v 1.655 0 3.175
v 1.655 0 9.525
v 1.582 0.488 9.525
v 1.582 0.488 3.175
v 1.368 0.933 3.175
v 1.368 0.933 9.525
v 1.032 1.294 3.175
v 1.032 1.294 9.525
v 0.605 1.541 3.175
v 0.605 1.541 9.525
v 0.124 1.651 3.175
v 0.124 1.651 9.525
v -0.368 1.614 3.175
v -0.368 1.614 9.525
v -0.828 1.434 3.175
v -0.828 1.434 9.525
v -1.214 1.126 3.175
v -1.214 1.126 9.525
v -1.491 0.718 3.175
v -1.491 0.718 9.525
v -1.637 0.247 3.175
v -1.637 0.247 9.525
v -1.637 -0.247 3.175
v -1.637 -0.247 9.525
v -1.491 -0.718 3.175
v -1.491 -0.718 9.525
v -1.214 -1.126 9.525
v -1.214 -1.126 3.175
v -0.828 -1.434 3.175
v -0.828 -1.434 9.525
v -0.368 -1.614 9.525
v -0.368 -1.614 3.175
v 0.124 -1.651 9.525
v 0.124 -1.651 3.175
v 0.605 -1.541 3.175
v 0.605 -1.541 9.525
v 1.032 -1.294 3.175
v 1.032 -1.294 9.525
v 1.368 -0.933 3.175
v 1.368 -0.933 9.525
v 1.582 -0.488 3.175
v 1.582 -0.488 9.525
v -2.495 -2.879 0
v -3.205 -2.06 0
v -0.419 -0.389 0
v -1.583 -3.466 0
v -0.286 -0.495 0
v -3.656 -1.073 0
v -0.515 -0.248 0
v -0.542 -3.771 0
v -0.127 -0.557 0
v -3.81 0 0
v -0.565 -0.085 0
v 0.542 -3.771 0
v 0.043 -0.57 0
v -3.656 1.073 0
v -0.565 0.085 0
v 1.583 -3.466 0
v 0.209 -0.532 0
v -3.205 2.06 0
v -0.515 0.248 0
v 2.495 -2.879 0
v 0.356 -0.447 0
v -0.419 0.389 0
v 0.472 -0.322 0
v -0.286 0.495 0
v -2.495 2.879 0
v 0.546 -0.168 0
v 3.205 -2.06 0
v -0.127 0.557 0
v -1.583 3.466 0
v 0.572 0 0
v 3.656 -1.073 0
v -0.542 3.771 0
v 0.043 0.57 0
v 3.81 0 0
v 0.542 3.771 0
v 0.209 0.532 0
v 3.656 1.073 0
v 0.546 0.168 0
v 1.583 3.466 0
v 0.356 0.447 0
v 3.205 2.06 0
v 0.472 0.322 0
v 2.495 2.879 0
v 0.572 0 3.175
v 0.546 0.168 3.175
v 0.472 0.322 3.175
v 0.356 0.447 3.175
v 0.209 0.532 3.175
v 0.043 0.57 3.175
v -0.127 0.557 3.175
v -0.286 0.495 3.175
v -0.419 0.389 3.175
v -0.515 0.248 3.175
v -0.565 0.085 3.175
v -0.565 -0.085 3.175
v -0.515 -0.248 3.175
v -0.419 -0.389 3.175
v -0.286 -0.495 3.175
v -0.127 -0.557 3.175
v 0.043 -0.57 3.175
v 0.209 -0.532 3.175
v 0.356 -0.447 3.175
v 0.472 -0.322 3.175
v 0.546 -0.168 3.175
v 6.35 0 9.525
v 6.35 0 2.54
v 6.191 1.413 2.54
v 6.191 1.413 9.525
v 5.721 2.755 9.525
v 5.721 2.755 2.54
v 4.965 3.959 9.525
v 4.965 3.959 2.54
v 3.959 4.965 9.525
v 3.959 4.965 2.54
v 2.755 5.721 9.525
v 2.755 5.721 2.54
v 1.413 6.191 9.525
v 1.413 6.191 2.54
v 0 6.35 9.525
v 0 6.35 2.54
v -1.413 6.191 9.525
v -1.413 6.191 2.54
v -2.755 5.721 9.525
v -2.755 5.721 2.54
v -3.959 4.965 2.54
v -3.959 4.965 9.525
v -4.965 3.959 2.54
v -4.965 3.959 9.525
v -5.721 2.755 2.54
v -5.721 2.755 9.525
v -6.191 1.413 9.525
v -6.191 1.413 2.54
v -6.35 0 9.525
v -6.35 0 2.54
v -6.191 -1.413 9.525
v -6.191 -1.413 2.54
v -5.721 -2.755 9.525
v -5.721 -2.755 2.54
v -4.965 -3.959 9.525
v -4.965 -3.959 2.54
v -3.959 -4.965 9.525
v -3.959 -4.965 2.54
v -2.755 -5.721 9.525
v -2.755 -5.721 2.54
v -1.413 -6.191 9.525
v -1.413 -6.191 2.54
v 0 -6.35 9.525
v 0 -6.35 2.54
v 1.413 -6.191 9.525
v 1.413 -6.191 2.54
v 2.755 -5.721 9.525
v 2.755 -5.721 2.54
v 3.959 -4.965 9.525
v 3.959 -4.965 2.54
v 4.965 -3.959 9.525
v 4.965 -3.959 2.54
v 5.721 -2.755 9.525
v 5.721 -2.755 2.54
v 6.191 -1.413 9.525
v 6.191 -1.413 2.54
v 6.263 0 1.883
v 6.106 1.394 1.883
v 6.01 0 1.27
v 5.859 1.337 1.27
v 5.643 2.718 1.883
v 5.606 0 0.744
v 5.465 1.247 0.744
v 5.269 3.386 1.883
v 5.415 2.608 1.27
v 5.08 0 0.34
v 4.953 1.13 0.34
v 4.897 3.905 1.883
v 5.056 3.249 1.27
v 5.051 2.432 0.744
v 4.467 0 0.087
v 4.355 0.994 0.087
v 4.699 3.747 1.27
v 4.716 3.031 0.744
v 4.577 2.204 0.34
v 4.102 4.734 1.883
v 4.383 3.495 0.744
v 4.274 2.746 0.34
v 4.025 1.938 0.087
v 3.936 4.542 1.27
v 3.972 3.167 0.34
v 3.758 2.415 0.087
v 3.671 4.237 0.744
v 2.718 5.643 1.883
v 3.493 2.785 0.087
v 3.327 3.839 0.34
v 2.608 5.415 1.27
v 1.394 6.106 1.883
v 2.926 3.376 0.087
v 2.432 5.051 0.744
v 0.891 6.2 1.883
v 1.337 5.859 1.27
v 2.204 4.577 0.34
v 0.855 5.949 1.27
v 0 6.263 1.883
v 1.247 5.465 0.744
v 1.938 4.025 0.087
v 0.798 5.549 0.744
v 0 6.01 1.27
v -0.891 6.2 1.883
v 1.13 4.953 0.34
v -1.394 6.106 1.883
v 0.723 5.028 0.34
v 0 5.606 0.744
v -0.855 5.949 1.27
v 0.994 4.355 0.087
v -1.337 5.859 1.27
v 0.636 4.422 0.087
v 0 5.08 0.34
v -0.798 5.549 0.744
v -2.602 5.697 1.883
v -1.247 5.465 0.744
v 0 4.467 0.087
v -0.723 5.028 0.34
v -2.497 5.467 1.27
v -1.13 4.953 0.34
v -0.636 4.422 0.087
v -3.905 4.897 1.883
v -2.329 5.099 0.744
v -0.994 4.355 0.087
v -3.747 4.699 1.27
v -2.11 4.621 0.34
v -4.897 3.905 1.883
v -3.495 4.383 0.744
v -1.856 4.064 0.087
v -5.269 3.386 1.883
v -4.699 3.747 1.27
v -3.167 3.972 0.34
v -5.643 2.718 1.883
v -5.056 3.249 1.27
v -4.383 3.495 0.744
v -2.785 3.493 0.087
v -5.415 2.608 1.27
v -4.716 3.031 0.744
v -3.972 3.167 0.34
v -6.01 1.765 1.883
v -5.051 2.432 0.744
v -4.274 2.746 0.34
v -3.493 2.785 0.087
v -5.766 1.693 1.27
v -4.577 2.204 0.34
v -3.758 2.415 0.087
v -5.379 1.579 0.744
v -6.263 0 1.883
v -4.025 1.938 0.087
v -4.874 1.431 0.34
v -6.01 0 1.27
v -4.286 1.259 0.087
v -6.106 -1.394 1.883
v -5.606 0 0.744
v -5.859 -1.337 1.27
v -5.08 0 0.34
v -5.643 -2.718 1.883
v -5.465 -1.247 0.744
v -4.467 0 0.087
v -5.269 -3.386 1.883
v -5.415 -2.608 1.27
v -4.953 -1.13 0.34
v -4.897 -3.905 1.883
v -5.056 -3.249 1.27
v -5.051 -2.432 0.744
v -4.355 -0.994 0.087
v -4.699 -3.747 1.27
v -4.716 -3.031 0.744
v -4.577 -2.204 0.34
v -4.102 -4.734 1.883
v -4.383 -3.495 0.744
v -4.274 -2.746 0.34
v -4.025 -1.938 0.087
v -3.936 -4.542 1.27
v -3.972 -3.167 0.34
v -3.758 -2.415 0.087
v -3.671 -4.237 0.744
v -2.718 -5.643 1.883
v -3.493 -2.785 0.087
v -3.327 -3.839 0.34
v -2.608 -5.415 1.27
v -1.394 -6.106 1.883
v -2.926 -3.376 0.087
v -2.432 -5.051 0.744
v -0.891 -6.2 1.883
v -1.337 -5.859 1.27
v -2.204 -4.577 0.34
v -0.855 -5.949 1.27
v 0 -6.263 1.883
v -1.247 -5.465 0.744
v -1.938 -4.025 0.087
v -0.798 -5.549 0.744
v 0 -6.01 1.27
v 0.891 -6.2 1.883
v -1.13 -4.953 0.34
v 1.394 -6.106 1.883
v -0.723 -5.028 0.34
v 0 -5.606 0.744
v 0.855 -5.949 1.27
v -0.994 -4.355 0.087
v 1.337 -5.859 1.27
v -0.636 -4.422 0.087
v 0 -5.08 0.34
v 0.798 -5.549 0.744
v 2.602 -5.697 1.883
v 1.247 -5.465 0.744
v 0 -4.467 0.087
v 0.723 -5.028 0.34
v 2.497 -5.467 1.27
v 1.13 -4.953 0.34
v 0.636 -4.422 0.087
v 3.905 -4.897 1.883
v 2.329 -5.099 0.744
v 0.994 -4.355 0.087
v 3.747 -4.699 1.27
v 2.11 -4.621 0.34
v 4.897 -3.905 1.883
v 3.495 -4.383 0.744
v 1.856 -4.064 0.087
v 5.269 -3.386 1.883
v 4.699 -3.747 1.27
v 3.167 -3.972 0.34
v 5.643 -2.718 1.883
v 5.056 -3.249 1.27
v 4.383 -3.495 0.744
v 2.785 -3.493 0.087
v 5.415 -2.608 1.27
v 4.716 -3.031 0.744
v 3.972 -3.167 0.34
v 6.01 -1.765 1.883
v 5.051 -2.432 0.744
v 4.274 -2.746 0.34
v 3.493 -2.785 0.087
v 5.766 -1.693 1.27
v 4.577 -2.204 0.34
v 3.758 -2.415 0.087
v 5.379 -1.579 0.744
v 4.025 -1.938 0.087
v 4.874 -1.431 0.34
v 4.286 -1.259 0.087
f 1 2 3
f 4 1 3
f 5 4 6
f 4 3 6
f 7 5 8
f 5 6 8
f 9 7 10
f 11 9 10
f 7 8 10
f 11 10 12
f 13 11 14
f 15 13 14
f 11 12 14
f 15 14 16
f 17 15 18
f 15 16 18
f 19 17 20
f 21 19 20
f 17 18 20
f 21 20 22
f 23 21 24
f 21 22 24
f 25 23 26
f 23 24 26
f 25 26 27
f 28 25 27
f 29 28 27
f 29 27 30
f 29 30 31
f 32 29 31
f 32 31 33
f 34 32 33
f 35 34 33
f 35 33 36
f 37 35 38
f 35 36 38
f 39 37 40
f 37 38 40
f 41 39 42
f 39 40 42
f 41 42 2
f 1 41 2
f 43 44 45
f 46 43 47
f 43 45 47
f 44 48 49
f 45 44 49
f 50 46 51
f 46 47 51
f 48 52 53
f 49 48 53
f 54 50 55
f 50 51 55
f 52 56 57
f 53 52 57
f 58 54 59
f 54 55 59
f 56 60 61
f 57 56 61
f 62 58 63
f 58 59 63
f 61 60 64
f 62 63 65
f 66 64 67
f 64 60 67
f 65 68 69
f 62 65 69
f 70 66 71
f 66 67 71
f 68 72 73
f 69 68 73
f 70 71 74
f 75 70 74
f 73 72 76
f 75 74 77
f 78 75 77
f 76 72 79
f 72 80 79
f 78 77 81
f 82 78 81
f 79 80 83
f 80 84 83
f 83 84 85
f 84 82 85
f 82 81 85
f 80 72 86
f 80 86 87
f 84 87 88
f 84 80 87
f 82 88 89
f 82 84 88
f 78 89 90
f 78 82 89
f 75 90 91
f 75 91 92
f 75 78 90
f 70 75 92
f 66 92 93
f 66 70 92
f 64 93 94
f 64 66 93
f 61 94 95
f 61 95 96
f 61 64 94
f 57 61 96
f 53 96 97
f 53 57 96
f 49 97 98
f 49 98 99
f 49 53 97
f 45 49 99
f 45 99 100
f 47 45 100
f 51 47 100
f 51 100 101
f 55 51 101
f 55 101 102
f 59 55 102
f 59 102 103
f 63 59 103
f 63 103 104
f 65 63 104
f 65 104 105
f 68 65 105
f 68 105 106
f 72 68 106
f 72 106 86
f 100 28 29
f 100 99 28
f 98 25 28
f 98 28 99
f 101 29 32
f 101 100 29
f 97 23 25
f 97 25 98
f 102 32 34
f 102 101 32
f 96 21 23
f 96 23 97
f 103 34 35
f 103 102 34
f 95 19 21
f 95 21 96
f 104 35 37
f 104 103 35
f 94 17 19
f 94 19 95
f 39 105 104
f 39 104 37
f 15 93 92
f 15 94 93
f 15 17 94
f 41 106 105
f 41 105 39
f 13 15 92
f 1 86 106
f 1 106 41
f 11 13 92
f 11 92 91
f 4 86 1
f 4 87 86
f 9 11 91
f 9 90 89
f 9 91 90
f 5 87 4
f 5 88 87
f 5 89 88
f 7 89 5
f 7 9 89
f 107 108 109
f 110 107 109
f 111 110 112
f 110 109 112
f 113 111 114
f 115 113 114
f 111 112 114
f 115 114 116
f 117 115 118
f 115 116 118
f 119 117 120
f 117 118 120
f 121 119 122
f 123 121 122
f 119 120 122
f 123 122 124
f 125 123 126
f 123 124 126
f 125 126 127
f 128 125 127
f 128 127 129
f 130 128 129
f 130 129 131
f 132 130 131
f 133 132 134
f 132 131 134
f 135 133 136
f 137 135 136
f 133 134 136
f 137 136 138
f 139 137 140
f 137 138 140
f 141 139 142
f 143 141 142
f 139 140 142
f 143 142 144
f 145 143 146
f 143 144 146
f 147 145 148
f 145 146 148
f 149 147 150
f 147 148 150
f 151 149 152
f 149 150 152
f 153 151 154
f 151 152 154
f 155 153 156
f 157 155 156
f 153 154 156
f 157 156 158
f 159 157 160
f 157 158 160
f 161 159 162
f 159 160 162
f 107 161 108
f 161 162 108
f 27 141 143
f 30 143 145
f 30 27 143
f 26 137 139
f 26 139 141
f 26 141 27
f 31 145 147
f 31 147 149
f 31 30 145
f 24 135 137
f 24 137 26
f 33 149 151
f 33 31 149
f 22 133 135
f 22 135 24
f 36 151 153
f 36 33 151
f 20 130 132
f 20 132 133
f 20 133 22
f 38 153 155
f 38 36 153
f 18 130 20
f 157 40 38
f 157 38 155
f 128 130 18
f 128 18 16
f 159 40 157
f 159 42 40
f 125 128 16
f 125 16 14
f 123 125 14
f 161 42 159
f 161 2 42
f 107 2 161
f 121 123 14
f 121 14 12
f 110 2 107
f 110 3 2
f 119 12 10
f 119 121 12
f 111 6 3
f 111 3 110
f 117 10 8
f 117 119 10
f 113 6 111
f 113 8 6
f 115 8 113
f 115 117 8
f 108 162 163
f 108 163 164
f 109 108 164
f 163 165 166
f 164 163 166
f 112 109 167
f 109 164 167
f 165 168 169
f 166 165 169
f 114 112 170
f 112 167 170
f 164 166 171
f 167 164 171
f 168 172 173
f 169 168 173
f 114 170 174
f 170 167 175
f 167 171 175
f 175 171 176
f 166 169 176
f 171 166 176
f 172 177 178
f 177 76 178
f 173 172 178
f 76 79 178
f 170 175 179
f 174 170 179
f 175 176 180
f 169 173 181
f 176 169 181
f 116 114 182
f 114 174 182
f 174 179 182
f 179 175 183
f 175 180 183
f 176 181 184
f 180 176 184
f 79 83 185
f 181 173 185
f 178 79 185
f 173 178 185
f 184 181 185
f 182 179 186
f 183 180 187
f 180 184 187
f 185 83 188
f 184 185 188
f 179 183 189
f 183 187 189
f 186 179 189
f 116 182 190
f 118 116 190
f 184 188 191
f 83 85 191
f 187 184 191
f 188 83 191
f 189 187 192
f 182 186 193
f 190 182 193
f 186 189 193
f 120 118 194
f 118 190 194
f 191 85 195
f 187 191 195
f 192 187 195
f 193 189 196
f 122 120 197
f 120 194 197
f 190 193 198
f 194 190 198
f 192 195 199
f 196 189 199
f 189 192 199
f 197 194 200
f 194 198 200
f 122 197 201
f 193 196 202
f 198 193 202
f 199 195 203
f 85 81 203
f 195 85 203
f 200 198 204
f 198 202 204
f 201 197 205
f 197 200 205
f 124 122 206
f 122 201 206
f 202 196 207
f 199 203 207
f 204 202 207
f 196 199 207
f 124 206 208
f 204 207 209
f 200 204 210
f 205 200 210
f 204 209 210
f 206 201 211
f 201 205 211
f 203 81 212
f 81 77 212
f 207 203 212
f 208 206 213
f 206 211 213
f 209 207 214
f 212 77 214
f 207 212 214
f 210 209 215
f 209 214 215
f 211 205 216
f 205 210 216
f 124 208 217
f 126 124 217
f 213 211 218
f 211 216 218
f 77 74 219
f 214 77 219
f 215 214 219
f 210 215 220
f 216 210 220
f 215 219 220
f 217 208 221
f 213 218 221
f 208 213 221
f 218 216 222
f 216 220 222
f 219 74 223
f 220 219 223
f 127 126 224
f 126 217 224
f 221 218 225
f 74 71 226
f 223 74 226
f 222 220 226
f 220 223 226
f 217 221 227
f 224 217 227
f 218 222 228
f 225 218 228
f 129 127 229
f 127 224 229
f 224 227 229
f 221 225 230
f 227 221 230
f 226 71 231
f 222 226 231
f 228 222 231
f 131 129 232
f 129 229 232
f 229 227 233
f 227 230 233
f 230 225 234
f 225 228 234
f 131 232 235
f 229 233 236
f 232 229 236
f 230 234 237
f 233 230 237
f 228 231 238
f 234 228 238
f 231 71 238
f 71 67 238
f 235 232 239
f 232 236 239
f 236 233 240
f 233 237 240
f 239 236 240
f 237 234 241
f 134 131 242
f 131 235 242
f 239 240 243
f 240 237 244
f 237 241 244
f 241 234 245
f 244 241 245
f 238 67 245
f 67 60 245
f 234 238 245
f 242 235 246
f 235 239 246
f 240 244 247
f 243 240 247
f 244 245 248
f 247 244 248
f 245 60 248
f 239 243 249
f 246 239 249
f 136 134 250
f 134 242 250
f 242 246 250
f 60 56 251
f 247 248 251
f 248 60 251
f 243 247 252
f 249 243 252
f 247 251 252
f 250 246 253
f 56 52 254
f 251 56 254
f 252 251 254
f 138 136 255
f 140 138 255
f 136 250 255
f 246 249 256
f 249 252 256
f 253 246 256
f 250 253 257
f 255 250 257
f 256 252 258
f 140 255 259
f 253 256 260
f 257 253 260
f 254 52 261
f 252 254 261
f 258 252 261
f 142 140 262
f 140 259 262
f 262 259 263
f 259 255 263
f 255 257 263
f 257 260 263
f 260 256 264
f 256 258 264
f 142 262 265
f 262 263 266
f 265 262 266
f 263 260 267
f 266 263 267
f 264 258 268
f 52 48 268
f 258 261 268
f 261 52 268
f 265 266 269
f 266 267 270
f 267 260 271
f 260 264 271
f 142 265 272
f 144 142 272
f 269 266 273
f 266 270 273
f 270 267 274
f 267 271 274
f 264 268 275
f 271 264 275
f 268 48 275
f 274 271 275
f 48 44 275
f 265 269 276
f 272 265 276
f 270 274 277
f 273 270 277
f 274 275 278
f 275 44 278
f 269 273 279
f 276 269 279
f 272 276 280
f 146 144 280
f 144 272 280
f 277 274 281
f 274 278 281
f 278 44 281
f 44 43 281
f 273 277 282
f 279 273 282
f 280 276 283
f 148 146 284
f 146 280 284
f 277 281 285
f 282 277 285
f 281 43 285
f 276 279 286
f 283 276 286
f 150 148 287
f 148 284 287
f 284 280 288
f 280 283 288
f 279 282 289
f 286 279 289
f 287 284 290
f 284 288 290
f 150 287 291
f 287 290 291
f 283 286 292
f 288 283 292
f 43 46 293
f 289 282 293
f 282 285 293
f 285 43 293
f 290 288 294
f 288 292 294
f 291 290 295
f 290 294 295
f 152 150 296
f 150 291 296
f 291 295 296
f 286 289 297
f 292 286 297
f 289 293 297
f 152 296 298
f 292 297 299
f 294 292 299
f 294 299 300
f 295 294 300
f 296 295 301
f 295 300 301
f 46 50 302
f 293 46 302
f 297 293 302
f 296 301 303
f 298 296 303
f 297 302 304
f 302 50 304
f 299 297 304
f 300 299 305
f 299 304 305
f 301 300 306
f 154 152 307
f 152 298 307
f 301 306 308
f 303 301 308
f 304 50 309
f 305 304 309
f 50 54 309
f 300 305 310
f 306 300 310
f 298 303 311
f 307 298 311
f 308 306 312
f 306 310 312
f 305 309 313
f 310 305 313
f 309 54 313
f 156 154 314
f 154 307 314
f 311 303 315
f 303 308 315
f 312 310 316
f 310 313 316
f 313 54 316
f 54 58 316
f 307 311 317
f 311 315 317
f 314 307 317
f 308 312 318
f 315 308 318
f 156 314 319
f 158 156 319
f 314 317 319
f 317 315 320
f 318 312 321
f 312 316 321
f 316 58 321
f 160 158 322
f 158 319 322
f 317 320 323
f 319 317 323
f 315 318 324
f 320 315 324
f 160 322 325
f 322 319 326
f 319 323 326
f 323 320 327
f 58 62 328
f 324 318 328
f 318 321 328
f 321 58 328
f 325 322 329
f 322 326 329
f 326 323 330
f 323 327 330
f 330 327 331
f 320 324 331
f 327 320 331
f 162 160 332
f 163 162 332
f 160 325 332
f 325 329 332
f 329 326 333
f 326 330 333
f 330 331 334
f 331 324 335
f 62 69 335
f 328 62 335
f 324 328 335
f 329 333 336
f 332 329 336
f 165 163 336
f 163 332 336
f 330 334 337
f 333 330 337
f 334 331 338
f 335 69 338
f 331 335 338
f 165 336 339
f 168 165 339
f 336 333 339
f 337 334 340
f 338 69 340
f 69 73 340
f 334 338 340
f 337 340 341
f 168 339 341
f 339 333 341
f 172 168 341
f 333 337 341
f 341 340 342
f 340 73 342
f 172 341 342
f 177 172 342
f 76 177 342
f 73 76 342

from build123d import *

# Parameters (mm, degrees)
F0_R     = 6.35
F0_R_2   = 0.5715
F1_DEPTH = 9.525
F2_R     = 1.655421
F2_R_2   = 0.5715
F3_DEPTH = 6.35
F4_R     = 2.54


with BuildPart() as f1:
    # F0 (on Top) → F1 (new body)
    with BuildSketch(Plane.XY):
        Circle(F0_R)
        Circle(F0_R_2, mode=Mode.SUBTRACT)
    extrude(amount=F1_DEPTH)

    # F2 (on face) → F3 (cut)
    with BuildSketch(Plane.XY.offset(9.525)):
        Circle(F2_R)
        Circle(F2_R_2, mode=Mode.SUBTRACT)
    extrude(amount=-F3_DEPTH, mode=Mode.SUBTRACT)

    # F4
    f4_edges = [f1.edges().sort_by_distance(p)[0] for p in [
        (-6.35, 0, 0),
    ]]
    fillet(f4_edges, radius=F4_R)


solid = f1.part
